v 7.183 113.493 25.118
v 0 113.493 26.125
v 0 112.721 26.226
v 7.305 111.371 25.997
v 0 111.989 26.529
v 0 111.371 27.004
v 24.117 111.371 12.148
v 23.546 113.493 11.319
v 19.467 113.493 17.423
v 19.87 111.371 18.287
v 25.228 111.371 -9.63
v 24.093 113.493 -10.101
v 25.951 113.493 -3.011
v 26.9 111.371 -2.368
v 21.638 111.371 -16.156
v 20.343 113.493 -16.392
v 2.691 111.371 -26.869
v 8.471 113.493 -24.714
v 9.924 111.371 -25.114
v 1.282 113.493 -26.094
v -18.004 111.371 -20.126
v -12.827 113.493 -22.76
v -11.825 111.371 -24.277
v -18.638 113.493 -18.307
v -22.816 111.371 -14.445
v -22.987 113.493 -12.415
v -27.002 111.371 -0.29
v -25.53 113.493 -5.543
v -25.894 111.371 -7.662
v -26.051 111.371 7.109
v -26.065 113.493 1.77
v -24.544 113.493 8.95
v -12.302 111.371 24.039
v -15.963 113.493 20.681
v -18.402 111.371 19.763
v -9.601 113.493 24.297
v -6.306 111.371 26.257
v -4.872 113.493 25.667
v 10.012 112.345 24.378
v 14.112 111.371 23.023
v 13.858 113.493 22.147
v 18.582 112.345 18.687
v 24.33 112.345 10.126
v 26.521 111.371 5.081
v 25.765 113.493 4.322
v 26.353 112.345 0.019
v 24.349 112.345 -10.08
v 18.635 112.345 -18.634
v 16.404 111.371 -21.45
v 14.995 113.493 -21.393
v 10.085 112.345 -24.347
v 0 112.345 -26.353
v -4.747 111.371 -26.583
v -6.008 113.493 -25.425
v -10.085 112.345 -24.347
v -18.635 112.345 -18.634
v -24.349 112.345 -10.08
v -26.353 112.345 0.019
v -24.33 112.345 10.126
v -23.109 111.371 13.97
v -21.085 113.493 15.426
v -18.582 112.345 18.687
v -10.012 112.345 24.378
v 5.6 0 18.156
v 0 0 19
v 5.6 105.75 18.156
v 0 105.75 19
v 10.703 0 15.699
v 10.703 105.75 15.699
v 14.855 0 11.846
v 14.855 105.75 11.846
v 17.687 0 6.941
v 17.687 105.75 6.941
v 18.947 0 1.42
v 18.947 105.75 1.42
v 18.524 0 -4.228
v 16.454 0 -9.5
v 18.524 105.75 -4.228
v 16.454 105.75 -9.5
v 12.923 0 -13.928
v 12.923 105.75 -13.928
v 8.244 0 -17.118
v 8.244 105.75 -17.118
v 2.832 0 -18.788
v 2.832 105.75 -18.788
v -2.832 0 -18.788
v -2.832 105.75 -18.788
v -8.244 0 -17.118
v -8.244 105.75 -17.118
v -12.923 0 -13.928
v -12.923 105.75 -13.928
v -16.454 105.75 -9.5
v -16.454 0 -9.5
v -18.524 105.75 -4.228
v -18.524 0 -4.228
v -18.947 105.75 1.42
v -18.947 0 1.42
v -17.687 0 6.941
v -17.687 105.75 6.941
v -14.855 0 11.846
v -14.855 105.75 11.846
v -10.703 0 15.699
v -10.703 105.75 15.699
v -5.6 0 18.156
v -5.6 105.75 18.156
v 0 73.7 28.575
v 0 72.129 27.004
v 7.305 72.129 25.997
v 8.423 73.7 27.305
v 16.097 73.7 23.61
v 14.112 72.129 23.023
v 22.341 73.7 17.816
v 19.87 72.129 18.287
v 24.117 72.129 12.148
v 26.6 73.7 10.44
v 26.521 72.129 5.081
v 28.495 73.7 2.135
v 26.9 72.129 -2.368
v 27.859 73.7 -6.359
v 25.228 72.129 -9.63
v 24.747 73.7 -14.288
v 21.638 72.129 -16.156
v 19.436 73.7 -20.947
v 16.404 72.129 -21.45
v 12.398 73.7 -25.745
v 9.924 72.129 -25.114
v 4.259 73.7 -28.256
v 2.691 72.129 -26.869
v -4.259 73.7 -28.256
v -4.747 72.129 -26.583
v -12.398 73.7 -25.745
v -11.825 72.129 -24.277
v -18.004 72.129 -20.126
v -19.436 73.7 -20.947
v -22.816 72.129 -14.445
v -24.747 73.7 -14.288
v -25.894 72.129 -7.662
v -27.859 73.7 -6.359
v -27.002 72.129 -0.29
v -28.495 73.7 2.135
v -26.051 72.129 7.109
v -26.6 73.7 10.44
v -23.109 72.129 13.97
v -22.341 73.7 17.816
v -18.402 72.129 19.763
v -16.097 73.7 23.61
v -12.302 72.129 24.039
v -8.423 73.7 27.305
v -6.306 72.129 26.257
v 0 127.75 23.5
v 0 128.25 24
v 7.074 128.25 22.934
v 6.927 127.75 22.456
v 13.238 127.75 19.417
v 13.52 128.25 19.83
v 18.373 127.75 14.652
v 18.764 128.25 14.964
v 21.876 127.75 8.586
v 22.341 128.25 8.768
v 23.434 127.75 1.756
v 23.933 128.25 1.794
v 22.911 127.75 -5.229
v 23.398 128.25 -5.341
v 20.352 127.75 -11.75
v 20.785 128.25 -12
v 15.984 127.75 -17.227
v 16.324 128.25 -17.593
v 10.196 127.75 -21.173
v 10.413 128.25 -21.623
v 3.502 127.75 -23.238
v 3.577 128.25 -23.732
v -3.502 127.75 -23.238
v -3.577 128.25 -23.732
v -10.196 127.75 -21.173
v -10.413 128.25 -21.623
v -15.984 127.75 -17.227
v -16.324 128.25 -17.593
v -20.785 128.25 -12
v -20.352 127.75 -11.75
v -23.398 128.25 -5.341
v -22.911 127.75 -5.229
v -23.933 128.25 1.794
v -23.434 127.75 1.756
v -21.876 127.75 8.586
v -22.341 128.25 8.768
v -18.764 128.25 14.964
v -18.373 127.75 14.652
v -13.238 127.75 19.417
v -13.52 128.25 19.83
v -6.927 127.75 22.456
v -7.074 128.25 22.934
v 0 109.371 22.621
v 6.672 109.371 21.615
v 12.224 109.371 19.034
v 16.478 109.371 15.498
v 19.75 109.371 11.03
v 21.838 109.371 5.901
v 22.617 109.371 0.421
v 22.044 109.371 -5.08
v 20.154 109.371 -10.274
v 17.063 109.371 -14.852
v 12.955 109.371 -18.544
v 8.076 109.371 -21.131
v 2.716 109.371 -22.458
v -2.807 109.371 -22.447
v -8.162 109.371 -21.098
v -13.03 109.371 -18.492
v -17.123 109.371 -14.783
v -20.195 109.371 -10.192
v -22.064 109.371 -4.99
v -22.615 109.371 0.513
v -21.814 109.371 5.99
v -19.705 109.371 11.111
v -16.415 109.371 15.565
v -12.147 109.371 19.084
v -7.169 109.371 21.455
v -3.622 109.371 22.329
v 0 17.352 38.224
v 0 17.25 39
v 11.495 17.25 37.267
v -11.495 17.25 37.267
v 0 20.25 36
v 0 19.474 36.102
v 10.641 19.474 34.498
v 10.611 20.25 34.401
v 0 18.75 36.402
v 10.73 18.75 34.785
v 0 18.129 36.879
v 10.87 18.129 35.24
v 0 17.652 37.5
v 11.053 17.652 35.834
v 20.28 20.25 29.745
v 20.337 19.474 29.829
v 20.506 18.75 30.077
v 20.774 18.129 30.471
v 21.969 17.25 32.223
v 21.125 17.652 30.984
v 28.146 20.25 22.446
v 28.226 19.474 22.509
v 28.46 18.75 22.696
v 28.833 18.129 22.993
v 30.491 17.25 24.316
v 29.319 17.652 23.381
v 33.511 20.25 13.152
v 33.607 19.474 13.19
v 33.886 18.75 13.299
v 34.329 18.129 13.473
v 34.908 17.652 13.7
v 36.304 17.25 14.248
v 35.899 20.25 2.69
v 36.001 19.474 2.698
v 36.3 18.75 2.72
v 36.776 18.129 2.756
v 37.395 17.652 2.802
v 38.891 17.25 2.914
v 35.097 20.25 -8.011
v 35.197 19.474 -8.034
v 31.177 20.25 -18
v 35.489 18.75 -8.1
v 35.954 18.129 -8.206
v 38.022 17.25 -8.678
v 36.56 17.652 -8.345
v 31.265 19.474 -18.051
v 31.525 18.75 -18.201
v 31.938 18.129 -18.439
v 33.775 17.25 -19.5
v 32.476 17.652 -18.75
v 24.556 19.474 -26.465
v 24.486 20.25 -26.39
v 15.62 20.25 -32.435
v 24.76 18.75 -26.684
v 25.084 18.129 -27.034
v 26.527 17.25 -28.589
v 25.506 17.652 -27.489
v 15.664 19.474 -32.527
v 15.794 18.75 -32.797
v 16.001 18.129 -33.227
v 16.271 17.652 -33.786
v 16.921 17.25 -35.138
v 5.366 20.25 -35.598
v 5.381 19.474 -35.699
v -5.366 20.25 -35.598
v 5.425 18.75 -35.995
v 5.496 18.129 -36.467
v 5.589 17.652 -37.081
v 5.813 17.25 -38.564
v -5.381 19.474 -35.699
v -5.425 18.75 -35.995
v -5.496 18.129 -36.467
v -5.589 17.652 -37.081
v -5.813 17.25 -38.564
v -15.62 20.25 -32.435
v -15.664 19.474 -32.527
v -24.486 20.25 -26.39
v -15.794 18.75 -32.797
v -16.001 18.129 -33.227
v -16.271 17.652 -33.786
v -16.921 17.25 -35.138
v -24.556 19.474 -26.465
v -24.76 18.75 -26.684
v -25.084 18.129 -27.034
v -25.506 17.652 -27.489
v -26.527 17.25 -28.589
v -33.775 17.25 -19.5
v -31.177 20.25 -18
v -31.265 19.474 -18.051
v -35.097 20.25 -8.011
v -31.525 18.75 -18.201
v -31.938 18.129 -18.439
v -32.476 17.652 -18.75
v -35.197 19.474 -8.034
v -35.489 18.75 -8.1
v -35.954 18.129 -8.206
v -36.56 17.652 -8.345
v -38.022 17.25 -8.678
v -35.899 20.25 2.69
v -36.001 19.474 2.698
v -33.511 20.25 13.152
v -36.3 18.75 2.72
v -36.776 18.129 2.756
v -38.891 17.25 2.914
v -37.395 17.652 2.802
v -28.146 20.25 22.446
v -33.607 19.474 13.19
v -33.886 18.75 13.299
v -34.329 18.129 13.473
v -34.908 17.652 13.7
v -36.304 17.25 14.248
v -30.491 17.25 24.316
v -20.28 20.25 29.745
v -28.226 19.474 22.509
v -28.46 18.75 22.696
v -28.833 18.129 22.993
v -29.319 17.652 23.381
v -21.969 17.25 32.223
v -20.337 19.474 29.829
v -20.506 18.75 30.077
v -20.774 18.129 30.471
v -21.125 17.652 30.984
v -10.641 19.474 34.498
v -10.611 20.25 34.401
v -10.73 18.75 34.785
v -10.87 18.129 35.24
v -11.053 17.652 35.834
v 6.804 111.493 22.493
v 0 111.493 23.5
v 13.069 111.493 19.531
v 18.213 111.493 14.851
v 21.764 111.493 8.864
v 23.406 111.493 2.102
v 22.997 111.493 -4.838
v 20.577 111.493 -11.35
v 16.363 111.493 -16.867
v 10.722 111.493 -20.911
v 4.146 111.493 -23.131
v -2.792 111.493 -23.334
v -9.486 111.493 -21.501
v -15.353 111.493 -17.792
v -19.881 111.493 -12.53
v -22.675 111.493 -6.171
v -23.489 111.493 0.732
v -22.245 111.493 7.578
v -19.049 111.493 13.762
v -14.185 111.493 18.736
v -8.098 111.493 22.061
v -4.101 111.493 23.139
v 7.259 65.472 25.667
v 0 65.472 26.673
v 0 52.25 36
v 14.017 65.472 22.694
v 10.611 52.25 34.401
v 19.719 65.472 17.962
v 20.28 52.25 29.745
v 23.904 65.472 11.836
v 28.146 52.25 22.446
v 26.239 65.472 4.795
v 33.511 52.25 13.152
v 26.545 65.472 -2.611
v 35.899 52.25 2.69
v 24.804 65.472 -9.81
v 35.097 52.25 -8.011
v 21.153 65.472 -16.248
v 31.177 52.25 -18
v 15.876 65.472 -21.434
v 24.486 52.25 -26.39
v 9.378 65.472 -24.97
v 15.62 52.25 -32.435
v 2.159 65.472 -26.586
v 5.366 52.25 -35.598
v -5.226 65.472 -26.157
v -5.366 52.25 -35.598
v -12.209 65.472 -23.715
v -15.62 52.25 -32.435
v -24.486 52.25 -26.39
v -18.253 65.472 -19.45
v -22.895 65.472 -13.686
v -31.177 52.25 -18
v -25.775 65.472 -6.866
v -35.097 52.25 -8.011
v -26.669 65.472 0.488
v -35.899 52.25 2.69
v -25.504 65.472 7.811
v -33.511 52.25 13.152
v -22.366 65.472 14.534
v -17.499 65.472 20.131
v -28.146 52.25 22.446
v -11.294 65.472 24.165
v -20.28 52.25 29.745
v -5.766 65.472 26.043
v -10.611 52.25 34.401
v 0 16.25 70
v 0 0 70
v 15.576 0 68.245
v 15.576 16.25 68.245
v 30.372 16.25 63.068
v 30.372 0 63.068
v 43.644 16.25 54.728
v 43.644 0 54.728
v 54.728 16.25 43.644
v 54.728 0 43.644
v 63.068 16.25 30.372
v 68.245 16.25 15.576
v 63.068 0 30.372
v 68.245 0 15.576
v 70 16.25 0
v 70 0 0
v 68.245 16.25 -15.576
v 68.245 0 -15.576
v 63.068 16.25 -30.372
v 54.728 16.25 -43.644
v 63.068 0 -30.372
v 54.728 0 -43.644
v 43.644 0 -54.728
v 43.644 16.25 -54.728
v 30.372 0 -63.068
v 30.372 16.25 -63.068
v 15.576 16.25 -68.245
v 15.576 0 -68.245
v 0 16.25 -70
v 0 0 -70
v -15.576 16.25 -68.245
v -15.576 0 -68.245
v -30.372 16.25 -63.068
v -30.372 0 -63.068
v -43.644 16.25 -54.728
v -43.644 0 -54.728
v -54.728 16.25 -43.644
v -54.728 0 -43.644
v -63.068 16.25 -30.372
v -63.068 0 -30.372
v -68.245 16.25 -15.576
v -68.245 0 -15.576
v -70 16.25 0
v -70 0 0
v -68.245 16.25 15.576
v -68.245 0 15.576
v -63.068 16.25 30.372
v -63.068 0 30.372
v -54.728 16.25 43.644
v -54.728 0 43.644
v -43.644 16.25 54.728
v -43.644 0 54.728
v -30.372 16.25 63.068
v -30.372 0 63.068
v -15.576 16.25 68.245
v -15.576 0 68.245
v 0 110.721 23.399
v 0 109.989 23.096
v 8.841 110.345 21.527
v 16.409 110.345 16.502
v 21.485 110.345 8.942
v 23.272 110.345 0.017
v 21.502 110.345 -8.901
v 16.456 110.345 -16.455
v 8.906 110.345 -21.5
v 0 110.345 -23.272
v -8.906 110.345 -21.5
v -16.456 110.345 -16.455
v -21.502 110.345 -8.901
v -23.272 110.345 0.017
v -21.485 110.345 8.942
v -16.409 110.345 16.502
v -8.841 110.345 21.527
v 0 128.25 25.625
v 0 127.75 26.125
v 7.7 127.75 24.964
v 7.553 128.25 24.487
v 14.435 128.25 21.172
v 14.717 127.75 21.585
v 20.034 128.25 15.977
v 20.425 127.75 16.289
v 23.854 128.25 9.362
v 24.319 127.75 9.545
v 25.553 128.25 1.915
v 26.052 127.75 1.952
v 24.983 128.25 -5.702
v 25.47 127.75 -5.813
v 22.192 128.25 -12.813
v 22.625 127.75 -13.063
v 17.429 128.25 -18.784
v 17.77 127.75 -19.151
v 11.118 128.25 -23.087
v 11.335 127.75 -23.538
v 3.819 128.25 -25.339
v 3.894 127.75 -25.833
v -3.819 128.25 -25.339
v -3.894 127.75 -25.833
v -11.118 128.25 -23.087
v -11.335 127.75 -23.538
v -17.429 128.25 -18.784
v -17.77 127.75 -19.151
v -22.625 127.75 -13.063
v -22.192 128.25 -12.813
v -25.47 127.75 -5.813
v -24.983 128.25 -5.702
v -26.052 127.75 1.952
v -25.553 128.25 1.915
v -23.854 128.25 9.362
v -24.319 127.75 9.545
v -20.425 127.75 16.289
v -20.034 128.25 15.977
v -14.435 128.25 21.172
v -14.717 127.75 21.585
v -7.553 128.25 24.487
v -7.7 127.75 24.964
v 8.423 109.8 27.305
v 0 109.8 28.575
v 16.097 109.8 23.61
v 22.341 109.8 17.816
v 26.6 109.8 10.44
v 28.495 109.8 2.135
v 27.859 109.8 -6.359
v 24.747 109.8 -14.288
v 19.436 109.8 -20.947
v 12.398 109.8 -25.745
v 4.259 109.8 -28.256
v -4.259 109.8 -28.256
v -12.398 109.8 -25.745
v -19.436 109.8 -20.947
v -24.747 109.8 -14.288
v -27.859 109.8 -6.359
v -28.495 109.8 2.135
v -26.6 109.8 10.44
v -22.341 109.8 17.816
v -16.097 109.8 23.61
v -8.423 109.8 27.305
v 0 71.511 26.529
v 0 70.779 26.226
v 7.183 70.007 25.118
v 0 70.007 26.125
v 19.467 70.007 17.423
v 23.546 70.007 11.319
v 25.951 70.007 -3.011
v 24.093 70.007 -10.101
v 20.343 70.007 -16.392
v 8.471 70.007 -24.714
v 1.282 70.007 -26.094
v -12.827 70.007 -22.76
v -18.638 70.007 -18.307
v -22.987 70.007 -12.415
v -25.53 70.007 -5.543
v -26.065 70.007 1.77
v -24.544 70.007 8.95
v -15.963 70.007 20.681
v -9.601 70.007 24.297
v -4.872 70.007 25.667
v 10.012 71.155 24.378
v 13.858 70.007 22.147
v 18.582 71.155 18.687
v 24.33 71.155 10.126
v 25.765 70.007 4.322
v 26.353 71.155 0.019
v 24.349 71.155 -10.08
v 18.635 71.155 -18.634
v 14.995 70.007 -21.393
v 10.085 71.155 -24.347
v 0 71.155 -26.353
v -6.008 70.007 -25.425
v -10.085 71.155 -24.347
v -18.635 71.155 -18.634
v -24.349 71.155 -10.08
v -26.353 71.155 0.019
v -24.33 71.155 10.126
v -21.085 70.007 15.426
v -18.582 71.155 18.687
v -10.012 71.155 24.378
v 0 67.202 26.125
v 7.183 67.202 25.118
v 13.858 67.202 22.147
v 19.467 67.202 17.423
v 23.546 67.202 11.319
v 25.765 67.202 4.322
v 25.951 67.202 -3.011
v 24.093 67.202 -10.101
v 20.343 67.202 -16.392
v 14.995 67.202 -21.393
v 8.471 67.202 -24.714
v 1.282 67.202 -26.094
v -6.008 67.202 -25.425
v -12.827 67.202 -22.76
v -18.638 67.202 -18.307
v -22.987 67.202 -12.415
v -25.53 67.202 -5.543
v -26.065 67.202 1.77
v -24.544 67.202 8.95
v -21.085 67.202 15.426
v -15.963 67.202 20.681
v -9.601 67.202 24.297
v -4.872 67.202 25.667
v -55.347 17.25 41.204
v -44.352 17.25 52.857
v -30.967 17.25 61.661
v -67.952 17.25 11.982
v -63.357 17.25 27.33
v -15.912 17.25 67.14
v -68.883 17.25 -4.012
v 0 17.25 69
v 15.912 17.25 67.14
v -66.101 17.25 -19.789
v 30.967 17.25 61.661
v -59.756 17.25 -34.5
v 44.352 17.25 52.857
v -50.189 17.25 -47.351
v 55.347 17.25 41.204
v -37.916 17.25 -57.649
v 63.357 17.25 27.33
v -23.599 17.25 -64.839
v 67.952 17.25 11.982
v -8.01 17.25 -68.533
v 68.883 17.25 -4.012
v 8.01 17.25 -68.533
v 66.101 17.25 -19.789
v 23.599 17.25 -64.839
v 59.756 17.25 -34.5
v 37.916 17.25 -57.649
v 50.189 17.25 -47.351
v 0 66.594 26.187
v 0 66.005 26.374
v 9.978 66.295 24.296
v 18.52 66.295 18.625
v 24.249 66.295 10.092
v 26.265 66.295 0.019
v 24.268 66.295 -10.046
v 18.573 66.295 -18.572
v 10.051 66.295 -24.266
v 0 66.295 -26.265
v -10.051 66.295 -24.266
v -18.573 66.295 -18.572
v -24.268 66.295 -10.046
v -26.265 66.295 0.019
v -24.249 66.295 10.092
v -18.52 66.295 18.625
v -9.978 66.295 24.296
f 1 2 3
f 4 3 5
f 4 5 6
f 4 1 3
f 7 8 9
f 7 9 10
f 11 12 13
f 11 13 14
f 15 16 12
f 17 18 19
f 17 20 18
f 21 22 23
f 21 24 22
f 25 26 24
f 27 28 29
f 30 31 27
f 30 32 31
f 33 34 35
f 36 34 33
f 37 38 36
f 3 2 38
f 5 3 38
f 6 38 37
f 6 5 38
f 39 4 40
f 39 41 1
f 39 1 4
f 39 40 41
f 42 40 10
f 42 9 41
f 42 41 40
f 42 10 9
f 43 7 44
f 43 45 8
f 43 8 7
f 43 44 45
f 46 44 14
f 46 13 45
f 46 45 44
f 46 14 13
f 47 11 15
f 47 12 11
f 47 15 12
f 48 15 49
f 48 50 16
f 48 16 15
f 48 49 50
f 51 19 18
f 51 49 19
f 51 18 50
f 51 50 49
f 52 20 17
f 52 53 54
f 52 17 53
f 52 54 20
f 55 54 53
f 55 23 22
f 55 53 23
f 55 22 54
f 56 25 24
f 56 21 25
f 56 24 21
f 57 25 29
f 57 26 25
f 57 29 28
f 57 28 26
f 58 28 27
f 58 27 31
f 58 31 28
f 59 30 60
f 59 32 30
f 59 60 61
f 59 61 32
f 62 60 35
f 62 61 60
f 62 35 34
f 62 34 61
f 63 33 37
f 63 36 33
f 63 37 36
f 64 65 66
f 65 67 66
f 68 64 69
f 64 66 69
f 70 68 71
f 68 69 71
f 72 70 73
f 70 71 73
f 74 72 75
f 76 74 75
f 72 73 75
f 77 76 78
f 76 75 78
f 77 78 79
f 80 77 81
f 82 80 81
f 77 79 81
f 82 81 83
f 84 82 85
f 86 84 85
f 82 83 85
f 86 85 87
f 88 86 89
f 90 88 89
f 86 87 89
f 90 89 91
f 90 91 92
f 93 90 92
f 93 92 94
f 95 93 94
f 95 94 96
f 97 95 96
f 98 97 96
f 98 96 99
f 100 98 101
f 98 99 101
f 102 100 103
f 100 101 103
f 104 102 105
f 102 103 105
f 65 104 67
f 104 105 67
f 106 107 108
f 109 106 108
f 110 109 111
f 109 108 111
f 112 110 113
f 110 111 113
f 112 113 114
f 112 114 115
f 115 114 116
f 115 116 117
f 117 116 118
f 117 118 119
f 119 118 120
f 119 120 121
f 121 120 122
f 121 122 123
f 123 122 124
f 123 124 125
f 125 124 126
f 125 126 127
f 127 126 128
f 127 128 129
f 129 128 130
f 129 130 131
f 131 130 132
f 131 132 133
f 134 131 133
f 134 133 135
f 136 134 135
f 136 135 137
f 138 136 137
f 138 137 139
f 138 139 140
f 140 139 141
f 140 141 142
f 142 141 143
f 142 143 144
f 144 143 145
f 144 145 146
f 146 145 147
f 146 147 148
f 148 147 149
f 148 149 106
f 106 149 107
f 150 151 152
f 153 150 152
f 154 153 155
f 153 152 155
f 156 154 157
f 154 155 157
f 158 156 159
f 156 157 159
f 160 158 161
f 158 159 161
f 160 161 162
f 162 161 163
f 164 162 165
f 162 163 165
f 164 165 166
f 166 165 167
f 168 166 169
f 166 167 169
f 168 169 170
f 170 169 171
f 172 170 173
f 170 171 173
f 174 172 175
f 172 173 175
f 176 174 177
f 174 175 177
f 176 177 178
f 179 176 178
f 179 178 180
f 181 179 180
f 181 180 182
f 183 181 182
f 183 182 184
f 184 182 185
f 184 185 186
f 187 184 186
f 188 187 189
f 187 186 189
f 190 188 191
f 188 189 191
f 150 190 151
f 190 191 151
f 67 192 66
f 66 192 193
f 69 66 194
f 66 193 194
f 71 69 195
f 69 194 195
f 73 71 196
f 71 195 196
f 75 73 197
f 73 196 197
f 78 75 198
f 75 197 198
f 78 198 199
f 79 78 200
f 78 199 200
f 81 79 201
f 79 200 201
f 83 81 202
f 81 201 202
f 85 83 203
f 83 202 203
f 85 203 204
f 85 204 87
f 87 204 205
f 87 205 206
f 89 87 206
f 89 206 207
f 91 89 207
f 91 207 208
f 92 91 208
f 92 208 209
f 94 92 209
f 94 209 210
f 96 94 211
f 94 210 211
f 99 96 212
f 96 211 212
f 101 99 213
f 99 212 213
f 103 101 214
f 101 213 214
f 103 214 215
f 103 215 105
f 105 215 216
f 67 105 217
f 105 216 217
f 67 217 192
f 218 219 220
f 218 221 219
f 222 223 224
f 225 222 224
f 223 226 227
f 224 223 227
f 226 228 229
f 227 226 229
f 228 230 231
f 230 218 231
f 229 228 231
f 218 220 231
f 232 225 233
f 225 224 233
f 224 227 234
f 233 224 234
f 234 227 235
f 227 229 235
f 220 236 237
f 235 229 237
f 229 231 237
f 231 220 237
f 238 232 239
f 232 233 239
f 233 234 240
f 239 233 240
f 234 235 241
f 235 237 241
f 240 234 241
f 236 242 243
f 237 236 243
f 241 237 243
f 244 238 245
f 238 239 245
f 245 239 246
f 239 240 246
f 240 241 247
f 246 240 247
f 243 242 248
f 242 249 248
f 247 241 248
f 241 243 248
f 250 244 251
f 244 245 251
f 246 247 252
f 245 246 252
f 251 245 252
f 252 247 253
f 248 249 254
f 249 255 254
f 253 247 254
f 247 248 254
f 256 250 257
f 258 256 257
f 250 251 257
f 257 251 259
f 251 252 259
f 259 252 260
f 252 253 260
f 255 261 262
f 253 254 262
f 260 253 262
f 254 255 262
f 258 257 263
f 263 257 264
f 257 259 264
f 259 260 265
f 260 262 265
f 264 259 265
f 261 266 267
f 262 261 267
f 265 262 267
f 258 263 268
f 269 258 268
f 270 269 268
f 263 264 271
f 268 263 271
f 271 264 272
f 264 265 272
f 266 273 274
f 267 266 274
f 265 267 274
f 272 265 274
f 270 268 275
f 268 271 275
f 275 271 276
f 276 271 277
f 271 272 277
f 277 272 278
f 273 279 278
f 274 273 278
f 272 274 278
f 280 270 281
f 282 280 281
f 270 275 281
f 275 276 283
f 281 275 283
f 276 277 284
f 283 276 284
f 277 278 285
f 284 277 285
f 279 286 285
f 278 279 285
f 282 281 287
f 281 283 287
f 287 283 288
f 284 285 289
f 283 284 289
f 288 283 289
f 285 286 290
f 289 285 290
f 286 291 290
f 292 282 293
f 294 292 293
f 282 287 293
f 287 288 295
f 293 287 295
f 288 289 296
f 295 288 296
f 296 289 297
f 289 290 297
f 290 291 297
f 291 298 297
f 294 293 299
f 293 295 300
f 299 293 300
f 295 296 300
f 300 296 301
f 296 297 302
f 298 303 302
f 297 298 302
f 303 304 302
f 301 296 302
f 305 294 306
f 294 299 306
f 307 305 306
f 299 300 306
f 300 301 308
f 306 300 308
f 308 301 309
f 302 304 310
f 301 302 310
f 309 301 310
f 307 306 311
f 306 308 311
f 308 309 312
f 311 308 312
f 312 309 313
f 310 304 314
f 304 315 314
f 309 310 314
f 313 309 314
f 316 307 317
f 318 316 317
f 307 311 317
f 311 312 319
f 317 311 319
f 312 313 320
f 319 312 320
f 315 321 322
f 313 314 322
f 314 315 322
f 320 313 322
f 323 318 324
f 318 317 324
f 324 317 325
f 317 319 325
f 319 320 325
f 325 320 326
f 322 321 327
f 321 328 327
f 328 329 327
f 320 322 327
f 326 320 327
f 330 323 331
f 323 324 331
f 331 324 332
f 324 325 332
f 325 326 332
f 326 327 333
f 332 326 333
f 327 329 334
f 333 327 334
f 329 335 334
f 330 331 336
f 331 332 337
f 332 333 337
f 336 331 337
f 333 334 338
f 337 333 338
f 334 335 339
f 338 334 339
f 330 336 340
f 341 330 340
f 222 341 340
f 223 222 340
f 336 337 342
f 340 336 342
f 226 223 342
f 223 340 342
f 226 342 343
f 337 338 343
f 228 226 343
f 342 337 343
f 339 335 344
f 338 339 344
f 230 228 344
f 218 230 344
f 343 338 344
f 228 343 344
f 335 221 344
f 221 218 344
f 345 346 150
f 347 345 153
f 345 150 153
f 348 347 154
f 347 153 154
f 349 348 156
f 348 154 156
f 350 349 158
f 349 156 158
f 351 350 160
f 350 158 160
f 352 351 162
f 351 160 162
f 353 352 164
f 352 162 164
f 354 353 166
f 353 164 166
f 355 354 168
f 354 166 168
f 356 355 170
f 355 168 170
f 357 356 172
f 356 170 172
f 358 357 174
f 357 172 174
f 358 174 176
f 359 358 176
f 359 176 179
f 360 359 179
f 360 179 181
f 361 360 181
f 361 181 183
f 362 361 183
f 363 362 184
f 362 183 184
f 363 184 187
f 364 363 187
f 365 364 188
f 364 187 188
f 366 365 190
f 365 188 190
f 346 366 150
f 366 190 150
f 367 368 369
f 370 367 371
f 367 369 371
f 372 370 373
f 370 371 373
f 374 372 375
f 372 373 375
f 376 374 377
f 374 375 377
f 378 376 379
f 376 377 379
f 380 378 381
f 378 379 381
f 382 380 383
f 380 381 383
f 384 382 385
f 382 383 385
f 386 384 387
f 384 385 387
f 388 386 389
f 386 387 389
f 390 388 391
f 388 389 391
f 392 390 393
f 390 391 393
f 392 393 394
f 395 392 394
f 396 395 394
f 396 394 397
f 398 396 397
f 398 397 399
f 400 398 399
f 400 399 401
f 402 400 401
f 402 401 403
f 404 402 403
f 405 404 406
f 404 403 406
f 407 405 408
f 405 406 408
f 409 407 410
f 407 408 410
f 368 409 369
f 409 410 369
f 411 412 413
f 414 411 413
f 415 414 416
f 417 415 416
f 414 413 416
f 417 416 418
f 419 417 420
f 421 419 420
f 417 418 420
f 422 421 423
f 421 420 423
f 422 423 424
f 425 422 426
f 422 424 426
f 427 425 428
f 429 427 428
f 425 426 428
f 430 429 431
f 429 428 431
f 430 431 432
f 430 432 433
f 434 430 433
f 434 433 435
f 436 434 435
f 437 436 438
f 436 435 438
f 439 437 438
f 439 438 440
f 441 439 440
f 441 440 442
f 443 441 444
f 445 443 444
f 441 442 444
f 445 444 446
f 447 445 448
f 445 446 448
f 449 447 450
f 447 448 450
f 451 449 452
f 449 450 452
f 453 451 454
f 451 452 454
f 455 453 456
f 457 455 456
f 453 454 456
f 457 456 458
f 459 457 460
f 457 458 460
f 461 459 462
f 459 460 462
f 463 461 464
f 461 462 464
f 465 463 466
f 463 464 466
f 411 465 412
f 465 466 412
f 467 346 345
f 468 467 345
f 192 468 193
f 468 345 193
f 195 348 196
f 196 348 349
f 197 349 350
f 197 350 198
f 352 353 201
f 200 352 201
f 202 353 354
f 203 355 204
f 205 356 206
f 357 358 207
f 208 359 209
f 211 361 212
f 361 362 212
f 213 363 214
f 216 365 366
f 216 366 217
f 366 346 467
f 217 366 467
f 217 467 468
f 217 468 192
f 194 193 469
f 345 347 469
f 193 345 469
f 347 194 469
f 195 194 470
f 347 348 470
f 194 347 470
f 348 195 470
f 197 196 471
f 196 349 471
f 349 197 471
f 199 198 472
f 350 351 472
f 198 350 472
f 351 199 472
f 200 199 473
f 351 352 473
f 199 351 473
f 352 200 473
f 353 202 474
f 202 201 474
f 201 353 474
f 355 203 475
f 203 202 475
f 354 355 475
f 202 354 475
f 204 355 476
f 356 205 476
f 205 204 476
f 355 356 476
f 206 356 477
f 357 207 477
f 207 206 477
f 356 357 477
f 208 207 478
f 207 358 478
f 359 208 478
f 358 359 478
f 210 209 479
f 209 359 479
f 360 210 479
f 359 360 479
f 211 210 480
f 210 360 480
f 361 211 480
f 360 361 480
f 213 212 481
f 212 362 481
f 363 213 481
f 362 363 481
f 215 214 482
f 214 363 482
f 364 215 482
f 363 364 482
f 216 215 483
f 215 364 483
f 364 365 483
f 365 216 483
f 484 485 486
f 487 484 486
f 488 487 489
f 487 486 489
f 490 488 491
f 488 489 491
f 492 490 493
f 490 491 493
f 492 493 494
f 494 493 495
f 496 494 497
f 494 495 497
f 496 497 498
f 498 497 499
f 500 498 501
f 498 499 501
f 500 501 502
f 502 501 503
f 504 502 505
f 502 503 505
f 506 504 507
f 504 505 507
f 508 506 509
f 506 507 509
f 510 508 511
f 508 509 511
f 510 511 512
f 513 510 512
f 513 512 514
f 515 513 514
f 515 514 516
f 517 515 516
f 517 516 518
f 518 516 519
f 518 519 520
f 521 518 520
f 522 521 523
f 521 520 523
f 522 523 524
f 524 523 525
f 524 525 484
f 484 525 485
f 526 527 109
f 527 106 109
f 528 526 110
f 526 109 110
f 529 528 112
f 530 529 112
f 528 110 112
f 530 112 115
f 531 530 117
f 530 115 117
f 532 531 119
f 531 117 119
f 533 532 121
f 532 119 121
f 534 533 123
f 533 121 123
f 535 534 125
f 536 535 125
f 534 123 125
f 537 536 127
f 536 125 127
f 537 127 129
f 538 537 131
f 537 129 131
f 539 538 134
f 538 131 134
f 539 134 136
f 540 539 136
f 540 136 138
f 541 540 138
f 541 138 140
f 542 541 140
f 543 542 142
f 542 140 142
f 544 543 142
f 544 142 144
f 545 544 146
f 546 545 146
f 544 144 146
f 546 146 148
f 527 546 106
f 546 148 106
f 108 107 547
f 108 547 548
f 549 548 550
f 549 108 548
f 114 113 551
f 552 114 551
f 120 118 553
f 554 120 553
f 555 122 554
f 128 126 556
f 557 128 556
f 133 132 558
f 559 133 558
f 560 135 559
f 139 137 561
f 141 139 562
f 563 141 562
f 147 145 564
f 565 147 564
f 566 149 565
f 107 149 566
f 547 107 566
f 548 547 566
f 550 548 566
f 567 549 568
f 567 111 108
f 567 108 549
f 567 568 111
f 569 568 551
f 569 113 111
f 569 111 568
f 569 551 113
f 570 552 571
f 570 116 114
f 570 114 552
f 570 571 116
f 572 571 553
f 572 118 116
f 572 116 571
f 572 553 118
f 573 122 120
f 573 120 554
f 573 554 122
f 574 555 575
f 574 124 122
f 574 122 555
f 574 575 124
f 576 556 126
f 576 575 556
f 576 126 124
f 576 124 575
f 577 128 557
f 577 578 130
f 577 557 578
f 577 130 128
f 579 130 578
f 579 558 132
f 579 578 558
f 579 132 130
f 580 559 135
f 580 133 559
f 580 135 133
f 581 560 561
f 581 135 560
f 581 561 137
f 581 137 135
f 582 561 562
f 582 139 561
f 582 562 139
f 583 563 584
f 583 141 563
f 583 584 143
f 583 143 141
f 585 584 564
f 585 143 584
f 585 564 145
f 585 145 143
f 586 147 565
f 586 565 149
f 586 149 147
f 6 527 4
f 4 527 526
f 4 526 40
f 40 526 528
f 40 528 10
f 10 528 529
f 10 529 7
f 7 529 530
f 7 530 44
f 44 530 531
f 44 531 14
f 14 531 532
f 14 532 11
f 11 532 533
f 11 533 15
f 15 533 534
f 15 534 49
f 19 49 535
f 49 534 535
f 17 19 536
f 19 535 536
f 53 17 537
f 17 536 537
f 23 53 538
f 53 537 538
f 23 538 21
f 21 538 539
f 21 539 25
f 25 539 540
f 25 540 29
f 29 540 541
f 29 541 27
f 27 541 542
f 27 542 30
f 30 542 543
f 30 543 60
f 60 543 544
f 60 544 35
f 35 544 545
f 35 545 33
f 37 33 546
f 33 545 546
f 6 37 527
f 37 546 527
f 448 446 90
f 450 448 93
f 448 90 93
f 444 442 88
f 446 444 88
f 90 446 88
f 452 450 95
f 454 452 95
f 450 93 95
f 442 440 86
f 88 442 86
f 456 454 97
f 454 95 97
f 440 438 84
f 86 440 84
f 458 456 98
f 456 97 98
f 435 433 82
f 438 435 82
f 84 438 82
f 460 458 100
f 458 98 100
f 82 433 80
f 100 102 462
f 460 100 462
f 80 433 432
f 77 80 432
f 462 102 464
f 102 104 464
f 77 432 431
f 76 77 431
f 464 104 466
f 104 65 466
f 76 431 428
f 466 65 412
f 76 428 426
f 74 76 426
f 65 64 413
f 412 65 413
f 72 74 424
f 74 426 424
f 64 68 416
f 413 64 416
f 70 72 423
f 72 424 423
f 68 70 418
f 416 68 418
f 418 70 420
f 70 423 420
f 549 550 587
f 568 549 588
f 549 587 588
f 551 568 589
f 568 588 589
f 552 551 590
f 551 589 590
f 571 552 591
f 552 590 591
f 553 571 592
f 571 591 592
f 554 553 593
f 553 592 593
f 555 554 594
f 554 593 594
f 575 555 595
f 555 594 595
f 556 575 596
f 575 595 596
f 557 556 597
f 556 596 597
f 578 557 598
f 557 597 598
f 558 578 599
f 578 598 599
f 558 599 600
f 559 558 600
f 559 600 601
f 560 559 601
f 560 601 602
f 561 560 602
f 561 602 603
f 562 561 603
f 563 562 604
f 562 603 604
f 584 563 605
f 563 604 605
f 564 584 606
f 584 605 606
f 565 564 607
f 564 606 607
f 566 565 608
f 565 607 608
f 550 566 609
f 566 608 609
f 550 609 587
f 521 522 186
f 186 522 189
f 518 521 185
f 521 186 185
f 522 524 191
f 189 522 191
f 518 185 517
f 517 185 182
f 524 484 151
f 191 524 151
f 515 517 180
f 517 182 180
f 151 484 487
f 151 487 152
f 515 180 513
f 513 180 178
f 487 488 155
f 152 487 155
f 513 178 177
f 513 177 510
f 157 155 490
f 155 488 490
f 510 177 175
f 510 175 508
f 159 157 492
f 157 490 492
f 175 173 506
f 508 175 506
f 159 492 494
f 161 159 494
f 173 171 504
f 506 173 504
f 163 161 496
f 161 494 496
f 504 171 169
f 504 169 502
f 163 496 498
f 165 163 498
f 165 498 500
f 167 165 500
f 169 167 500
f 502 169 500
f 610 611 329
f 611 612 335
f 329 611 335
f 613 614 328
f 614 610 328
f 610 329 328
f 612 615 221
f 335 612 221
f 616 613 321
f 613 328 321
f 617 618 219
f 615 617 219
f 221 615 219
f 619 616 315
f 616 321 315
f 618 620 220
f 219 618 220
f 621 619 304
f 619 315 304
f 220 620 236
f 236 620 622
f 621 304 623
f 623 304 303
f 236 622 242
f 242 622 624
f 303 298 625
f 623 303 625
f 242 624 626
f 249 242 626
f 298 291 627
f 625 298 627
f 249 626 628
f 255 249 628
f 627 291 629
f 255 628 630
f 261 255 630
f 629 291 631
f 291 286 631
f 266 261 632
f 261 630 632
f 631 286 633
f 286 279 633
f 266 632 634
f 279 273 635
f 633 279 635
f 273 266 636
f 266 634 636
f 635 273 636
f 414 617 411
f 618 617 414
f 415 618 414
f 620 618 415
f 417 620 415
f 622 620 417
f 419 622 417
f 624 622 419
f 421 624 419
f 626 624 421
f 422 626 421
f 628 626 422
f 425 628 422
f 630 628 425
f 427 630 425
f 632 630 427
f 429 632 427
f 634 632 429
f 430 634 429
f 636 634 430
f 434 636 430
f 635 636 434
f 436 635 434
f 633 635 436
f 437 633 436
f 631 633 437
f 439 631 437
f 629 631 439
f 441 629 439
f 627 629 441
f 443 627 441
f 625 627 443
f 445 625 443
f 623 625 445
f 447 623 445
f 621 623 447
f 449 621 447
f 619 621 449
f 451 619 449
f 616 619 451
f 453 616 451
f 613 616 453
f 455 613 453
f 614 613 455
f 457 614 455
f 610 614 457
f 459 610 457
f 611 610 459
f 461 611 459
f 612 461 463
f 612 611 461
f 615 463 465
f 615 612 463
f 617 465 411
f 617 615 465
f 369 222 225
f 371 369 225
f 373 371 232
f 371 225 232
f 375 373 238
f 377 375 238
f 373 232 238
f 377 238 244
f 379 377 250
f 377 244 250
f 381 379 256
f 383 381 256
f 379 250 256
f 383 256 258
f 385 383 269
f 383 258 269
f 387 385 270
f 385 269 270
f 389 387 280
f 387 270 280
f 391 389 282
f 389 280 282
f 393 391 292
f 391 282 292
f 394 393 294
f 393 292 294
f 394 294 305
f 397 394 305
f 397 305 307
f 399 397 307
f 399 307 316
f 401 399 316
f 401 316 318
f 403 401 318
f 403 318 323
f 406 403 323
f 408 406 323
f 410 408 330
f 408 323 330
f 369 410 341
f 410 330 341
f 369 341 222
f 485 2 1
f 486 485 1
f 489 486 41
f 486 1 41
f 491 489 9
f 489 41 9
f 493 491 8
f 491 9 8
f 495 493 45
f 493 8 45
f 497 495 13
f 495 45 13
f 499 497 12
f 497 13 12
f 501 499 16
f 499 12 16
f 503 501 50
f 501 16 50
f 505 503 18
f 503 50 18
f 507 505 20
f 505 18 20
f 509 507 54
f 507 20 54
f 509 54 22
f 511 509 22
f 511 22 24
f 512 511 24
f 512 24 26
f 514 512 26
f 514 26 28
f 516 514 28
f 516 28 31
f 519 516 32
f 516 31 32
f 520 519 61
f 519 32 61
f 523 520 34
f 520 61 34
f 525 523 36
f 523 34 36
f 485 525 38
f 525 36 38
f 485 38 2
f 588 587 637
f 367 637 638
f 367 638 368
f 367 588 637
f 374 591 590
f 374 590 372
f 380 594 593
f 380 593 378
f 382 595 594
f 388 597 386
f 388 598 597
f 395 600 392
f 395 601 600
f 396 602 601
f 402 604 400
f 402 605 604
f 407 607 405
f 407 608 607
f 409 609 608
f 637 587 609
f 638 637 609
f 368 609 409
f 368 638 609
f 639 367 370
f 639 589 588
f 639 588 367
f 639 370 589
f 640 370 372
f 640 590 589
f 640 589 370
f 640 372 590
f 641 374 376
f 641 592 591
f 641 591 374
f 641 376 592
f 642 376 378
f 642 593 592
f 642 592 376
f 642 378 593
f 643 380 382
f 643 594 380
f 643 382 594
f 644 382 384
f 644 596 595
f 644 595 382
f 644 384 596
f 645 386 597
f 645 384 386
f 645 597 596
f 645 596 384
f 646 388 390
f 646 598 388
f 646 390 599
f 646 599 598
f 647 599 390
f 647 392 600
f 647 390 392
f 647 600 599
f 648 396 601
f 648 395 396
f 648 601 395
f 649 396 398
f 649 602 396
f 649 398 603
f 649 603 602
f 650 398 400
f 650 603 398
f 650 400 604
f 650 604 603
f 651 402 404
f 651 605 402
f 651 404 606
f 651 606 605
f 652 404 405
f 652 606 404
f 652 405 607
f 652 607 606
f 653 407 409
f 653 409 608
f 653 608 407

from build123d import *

# Parameters (mm, degrees)
F2_R    = 3
F3_R    = 3
F4_SIZE = 1
F5_SIZE = 0.5


with BuildPart() as f1:
    # F0 (on Right) → F1 (revolve)
    with BuildSketch(Plane.YZ):
        Polygon((0, 70), (0, 19), (105.75, 19), (110.25, 23.5), (128.25, 23.5), (128.25, 26.125), (112.25, 26.125), (109.8, 28.575), (73.7, 28.575), (71.25, 26.125), (66.25, 26.125), (52.25, 36), (17.25, 36), (17.25, 70), align=None)
    revolve(axis=Axis((0, 37.063913, 0), (0, 1, 0)))

    # F2
    f2_edges = [f1.edges().sort_by_distance(p)[0] for p in [
        (0, 17.25, -36),
        (0, 66.25, -26.125),
        (0, 71.25, -26.125),
        (0, 112.25, -26.125),
    ]]
    fillet(f2_edges, radius=F2_R)

    # F3
    f3_edges = [f1.edges().sort_by_distance(p)[0] for p in [
        (0, 110.25, -23.5),
    ]]
    fillet(f3_edges, radius=F3_R)

    # F4
    f4_edges = [f1.edges().sort_by_distance(p)[0] for p in [
        (0, 17.25, -70),
    ]]
    chamfer(f4_edges, length=F4_SIZE)

    # F5
    f5_edges = [f1.edges().sort_by_distance(p)[0] for p in [
        (0, 128.25, -26.125),
        (0, 128.25, -23.5),
    ]]
    chamfer(f5_edges, length=F5_SIZE)


solid = f1.part
